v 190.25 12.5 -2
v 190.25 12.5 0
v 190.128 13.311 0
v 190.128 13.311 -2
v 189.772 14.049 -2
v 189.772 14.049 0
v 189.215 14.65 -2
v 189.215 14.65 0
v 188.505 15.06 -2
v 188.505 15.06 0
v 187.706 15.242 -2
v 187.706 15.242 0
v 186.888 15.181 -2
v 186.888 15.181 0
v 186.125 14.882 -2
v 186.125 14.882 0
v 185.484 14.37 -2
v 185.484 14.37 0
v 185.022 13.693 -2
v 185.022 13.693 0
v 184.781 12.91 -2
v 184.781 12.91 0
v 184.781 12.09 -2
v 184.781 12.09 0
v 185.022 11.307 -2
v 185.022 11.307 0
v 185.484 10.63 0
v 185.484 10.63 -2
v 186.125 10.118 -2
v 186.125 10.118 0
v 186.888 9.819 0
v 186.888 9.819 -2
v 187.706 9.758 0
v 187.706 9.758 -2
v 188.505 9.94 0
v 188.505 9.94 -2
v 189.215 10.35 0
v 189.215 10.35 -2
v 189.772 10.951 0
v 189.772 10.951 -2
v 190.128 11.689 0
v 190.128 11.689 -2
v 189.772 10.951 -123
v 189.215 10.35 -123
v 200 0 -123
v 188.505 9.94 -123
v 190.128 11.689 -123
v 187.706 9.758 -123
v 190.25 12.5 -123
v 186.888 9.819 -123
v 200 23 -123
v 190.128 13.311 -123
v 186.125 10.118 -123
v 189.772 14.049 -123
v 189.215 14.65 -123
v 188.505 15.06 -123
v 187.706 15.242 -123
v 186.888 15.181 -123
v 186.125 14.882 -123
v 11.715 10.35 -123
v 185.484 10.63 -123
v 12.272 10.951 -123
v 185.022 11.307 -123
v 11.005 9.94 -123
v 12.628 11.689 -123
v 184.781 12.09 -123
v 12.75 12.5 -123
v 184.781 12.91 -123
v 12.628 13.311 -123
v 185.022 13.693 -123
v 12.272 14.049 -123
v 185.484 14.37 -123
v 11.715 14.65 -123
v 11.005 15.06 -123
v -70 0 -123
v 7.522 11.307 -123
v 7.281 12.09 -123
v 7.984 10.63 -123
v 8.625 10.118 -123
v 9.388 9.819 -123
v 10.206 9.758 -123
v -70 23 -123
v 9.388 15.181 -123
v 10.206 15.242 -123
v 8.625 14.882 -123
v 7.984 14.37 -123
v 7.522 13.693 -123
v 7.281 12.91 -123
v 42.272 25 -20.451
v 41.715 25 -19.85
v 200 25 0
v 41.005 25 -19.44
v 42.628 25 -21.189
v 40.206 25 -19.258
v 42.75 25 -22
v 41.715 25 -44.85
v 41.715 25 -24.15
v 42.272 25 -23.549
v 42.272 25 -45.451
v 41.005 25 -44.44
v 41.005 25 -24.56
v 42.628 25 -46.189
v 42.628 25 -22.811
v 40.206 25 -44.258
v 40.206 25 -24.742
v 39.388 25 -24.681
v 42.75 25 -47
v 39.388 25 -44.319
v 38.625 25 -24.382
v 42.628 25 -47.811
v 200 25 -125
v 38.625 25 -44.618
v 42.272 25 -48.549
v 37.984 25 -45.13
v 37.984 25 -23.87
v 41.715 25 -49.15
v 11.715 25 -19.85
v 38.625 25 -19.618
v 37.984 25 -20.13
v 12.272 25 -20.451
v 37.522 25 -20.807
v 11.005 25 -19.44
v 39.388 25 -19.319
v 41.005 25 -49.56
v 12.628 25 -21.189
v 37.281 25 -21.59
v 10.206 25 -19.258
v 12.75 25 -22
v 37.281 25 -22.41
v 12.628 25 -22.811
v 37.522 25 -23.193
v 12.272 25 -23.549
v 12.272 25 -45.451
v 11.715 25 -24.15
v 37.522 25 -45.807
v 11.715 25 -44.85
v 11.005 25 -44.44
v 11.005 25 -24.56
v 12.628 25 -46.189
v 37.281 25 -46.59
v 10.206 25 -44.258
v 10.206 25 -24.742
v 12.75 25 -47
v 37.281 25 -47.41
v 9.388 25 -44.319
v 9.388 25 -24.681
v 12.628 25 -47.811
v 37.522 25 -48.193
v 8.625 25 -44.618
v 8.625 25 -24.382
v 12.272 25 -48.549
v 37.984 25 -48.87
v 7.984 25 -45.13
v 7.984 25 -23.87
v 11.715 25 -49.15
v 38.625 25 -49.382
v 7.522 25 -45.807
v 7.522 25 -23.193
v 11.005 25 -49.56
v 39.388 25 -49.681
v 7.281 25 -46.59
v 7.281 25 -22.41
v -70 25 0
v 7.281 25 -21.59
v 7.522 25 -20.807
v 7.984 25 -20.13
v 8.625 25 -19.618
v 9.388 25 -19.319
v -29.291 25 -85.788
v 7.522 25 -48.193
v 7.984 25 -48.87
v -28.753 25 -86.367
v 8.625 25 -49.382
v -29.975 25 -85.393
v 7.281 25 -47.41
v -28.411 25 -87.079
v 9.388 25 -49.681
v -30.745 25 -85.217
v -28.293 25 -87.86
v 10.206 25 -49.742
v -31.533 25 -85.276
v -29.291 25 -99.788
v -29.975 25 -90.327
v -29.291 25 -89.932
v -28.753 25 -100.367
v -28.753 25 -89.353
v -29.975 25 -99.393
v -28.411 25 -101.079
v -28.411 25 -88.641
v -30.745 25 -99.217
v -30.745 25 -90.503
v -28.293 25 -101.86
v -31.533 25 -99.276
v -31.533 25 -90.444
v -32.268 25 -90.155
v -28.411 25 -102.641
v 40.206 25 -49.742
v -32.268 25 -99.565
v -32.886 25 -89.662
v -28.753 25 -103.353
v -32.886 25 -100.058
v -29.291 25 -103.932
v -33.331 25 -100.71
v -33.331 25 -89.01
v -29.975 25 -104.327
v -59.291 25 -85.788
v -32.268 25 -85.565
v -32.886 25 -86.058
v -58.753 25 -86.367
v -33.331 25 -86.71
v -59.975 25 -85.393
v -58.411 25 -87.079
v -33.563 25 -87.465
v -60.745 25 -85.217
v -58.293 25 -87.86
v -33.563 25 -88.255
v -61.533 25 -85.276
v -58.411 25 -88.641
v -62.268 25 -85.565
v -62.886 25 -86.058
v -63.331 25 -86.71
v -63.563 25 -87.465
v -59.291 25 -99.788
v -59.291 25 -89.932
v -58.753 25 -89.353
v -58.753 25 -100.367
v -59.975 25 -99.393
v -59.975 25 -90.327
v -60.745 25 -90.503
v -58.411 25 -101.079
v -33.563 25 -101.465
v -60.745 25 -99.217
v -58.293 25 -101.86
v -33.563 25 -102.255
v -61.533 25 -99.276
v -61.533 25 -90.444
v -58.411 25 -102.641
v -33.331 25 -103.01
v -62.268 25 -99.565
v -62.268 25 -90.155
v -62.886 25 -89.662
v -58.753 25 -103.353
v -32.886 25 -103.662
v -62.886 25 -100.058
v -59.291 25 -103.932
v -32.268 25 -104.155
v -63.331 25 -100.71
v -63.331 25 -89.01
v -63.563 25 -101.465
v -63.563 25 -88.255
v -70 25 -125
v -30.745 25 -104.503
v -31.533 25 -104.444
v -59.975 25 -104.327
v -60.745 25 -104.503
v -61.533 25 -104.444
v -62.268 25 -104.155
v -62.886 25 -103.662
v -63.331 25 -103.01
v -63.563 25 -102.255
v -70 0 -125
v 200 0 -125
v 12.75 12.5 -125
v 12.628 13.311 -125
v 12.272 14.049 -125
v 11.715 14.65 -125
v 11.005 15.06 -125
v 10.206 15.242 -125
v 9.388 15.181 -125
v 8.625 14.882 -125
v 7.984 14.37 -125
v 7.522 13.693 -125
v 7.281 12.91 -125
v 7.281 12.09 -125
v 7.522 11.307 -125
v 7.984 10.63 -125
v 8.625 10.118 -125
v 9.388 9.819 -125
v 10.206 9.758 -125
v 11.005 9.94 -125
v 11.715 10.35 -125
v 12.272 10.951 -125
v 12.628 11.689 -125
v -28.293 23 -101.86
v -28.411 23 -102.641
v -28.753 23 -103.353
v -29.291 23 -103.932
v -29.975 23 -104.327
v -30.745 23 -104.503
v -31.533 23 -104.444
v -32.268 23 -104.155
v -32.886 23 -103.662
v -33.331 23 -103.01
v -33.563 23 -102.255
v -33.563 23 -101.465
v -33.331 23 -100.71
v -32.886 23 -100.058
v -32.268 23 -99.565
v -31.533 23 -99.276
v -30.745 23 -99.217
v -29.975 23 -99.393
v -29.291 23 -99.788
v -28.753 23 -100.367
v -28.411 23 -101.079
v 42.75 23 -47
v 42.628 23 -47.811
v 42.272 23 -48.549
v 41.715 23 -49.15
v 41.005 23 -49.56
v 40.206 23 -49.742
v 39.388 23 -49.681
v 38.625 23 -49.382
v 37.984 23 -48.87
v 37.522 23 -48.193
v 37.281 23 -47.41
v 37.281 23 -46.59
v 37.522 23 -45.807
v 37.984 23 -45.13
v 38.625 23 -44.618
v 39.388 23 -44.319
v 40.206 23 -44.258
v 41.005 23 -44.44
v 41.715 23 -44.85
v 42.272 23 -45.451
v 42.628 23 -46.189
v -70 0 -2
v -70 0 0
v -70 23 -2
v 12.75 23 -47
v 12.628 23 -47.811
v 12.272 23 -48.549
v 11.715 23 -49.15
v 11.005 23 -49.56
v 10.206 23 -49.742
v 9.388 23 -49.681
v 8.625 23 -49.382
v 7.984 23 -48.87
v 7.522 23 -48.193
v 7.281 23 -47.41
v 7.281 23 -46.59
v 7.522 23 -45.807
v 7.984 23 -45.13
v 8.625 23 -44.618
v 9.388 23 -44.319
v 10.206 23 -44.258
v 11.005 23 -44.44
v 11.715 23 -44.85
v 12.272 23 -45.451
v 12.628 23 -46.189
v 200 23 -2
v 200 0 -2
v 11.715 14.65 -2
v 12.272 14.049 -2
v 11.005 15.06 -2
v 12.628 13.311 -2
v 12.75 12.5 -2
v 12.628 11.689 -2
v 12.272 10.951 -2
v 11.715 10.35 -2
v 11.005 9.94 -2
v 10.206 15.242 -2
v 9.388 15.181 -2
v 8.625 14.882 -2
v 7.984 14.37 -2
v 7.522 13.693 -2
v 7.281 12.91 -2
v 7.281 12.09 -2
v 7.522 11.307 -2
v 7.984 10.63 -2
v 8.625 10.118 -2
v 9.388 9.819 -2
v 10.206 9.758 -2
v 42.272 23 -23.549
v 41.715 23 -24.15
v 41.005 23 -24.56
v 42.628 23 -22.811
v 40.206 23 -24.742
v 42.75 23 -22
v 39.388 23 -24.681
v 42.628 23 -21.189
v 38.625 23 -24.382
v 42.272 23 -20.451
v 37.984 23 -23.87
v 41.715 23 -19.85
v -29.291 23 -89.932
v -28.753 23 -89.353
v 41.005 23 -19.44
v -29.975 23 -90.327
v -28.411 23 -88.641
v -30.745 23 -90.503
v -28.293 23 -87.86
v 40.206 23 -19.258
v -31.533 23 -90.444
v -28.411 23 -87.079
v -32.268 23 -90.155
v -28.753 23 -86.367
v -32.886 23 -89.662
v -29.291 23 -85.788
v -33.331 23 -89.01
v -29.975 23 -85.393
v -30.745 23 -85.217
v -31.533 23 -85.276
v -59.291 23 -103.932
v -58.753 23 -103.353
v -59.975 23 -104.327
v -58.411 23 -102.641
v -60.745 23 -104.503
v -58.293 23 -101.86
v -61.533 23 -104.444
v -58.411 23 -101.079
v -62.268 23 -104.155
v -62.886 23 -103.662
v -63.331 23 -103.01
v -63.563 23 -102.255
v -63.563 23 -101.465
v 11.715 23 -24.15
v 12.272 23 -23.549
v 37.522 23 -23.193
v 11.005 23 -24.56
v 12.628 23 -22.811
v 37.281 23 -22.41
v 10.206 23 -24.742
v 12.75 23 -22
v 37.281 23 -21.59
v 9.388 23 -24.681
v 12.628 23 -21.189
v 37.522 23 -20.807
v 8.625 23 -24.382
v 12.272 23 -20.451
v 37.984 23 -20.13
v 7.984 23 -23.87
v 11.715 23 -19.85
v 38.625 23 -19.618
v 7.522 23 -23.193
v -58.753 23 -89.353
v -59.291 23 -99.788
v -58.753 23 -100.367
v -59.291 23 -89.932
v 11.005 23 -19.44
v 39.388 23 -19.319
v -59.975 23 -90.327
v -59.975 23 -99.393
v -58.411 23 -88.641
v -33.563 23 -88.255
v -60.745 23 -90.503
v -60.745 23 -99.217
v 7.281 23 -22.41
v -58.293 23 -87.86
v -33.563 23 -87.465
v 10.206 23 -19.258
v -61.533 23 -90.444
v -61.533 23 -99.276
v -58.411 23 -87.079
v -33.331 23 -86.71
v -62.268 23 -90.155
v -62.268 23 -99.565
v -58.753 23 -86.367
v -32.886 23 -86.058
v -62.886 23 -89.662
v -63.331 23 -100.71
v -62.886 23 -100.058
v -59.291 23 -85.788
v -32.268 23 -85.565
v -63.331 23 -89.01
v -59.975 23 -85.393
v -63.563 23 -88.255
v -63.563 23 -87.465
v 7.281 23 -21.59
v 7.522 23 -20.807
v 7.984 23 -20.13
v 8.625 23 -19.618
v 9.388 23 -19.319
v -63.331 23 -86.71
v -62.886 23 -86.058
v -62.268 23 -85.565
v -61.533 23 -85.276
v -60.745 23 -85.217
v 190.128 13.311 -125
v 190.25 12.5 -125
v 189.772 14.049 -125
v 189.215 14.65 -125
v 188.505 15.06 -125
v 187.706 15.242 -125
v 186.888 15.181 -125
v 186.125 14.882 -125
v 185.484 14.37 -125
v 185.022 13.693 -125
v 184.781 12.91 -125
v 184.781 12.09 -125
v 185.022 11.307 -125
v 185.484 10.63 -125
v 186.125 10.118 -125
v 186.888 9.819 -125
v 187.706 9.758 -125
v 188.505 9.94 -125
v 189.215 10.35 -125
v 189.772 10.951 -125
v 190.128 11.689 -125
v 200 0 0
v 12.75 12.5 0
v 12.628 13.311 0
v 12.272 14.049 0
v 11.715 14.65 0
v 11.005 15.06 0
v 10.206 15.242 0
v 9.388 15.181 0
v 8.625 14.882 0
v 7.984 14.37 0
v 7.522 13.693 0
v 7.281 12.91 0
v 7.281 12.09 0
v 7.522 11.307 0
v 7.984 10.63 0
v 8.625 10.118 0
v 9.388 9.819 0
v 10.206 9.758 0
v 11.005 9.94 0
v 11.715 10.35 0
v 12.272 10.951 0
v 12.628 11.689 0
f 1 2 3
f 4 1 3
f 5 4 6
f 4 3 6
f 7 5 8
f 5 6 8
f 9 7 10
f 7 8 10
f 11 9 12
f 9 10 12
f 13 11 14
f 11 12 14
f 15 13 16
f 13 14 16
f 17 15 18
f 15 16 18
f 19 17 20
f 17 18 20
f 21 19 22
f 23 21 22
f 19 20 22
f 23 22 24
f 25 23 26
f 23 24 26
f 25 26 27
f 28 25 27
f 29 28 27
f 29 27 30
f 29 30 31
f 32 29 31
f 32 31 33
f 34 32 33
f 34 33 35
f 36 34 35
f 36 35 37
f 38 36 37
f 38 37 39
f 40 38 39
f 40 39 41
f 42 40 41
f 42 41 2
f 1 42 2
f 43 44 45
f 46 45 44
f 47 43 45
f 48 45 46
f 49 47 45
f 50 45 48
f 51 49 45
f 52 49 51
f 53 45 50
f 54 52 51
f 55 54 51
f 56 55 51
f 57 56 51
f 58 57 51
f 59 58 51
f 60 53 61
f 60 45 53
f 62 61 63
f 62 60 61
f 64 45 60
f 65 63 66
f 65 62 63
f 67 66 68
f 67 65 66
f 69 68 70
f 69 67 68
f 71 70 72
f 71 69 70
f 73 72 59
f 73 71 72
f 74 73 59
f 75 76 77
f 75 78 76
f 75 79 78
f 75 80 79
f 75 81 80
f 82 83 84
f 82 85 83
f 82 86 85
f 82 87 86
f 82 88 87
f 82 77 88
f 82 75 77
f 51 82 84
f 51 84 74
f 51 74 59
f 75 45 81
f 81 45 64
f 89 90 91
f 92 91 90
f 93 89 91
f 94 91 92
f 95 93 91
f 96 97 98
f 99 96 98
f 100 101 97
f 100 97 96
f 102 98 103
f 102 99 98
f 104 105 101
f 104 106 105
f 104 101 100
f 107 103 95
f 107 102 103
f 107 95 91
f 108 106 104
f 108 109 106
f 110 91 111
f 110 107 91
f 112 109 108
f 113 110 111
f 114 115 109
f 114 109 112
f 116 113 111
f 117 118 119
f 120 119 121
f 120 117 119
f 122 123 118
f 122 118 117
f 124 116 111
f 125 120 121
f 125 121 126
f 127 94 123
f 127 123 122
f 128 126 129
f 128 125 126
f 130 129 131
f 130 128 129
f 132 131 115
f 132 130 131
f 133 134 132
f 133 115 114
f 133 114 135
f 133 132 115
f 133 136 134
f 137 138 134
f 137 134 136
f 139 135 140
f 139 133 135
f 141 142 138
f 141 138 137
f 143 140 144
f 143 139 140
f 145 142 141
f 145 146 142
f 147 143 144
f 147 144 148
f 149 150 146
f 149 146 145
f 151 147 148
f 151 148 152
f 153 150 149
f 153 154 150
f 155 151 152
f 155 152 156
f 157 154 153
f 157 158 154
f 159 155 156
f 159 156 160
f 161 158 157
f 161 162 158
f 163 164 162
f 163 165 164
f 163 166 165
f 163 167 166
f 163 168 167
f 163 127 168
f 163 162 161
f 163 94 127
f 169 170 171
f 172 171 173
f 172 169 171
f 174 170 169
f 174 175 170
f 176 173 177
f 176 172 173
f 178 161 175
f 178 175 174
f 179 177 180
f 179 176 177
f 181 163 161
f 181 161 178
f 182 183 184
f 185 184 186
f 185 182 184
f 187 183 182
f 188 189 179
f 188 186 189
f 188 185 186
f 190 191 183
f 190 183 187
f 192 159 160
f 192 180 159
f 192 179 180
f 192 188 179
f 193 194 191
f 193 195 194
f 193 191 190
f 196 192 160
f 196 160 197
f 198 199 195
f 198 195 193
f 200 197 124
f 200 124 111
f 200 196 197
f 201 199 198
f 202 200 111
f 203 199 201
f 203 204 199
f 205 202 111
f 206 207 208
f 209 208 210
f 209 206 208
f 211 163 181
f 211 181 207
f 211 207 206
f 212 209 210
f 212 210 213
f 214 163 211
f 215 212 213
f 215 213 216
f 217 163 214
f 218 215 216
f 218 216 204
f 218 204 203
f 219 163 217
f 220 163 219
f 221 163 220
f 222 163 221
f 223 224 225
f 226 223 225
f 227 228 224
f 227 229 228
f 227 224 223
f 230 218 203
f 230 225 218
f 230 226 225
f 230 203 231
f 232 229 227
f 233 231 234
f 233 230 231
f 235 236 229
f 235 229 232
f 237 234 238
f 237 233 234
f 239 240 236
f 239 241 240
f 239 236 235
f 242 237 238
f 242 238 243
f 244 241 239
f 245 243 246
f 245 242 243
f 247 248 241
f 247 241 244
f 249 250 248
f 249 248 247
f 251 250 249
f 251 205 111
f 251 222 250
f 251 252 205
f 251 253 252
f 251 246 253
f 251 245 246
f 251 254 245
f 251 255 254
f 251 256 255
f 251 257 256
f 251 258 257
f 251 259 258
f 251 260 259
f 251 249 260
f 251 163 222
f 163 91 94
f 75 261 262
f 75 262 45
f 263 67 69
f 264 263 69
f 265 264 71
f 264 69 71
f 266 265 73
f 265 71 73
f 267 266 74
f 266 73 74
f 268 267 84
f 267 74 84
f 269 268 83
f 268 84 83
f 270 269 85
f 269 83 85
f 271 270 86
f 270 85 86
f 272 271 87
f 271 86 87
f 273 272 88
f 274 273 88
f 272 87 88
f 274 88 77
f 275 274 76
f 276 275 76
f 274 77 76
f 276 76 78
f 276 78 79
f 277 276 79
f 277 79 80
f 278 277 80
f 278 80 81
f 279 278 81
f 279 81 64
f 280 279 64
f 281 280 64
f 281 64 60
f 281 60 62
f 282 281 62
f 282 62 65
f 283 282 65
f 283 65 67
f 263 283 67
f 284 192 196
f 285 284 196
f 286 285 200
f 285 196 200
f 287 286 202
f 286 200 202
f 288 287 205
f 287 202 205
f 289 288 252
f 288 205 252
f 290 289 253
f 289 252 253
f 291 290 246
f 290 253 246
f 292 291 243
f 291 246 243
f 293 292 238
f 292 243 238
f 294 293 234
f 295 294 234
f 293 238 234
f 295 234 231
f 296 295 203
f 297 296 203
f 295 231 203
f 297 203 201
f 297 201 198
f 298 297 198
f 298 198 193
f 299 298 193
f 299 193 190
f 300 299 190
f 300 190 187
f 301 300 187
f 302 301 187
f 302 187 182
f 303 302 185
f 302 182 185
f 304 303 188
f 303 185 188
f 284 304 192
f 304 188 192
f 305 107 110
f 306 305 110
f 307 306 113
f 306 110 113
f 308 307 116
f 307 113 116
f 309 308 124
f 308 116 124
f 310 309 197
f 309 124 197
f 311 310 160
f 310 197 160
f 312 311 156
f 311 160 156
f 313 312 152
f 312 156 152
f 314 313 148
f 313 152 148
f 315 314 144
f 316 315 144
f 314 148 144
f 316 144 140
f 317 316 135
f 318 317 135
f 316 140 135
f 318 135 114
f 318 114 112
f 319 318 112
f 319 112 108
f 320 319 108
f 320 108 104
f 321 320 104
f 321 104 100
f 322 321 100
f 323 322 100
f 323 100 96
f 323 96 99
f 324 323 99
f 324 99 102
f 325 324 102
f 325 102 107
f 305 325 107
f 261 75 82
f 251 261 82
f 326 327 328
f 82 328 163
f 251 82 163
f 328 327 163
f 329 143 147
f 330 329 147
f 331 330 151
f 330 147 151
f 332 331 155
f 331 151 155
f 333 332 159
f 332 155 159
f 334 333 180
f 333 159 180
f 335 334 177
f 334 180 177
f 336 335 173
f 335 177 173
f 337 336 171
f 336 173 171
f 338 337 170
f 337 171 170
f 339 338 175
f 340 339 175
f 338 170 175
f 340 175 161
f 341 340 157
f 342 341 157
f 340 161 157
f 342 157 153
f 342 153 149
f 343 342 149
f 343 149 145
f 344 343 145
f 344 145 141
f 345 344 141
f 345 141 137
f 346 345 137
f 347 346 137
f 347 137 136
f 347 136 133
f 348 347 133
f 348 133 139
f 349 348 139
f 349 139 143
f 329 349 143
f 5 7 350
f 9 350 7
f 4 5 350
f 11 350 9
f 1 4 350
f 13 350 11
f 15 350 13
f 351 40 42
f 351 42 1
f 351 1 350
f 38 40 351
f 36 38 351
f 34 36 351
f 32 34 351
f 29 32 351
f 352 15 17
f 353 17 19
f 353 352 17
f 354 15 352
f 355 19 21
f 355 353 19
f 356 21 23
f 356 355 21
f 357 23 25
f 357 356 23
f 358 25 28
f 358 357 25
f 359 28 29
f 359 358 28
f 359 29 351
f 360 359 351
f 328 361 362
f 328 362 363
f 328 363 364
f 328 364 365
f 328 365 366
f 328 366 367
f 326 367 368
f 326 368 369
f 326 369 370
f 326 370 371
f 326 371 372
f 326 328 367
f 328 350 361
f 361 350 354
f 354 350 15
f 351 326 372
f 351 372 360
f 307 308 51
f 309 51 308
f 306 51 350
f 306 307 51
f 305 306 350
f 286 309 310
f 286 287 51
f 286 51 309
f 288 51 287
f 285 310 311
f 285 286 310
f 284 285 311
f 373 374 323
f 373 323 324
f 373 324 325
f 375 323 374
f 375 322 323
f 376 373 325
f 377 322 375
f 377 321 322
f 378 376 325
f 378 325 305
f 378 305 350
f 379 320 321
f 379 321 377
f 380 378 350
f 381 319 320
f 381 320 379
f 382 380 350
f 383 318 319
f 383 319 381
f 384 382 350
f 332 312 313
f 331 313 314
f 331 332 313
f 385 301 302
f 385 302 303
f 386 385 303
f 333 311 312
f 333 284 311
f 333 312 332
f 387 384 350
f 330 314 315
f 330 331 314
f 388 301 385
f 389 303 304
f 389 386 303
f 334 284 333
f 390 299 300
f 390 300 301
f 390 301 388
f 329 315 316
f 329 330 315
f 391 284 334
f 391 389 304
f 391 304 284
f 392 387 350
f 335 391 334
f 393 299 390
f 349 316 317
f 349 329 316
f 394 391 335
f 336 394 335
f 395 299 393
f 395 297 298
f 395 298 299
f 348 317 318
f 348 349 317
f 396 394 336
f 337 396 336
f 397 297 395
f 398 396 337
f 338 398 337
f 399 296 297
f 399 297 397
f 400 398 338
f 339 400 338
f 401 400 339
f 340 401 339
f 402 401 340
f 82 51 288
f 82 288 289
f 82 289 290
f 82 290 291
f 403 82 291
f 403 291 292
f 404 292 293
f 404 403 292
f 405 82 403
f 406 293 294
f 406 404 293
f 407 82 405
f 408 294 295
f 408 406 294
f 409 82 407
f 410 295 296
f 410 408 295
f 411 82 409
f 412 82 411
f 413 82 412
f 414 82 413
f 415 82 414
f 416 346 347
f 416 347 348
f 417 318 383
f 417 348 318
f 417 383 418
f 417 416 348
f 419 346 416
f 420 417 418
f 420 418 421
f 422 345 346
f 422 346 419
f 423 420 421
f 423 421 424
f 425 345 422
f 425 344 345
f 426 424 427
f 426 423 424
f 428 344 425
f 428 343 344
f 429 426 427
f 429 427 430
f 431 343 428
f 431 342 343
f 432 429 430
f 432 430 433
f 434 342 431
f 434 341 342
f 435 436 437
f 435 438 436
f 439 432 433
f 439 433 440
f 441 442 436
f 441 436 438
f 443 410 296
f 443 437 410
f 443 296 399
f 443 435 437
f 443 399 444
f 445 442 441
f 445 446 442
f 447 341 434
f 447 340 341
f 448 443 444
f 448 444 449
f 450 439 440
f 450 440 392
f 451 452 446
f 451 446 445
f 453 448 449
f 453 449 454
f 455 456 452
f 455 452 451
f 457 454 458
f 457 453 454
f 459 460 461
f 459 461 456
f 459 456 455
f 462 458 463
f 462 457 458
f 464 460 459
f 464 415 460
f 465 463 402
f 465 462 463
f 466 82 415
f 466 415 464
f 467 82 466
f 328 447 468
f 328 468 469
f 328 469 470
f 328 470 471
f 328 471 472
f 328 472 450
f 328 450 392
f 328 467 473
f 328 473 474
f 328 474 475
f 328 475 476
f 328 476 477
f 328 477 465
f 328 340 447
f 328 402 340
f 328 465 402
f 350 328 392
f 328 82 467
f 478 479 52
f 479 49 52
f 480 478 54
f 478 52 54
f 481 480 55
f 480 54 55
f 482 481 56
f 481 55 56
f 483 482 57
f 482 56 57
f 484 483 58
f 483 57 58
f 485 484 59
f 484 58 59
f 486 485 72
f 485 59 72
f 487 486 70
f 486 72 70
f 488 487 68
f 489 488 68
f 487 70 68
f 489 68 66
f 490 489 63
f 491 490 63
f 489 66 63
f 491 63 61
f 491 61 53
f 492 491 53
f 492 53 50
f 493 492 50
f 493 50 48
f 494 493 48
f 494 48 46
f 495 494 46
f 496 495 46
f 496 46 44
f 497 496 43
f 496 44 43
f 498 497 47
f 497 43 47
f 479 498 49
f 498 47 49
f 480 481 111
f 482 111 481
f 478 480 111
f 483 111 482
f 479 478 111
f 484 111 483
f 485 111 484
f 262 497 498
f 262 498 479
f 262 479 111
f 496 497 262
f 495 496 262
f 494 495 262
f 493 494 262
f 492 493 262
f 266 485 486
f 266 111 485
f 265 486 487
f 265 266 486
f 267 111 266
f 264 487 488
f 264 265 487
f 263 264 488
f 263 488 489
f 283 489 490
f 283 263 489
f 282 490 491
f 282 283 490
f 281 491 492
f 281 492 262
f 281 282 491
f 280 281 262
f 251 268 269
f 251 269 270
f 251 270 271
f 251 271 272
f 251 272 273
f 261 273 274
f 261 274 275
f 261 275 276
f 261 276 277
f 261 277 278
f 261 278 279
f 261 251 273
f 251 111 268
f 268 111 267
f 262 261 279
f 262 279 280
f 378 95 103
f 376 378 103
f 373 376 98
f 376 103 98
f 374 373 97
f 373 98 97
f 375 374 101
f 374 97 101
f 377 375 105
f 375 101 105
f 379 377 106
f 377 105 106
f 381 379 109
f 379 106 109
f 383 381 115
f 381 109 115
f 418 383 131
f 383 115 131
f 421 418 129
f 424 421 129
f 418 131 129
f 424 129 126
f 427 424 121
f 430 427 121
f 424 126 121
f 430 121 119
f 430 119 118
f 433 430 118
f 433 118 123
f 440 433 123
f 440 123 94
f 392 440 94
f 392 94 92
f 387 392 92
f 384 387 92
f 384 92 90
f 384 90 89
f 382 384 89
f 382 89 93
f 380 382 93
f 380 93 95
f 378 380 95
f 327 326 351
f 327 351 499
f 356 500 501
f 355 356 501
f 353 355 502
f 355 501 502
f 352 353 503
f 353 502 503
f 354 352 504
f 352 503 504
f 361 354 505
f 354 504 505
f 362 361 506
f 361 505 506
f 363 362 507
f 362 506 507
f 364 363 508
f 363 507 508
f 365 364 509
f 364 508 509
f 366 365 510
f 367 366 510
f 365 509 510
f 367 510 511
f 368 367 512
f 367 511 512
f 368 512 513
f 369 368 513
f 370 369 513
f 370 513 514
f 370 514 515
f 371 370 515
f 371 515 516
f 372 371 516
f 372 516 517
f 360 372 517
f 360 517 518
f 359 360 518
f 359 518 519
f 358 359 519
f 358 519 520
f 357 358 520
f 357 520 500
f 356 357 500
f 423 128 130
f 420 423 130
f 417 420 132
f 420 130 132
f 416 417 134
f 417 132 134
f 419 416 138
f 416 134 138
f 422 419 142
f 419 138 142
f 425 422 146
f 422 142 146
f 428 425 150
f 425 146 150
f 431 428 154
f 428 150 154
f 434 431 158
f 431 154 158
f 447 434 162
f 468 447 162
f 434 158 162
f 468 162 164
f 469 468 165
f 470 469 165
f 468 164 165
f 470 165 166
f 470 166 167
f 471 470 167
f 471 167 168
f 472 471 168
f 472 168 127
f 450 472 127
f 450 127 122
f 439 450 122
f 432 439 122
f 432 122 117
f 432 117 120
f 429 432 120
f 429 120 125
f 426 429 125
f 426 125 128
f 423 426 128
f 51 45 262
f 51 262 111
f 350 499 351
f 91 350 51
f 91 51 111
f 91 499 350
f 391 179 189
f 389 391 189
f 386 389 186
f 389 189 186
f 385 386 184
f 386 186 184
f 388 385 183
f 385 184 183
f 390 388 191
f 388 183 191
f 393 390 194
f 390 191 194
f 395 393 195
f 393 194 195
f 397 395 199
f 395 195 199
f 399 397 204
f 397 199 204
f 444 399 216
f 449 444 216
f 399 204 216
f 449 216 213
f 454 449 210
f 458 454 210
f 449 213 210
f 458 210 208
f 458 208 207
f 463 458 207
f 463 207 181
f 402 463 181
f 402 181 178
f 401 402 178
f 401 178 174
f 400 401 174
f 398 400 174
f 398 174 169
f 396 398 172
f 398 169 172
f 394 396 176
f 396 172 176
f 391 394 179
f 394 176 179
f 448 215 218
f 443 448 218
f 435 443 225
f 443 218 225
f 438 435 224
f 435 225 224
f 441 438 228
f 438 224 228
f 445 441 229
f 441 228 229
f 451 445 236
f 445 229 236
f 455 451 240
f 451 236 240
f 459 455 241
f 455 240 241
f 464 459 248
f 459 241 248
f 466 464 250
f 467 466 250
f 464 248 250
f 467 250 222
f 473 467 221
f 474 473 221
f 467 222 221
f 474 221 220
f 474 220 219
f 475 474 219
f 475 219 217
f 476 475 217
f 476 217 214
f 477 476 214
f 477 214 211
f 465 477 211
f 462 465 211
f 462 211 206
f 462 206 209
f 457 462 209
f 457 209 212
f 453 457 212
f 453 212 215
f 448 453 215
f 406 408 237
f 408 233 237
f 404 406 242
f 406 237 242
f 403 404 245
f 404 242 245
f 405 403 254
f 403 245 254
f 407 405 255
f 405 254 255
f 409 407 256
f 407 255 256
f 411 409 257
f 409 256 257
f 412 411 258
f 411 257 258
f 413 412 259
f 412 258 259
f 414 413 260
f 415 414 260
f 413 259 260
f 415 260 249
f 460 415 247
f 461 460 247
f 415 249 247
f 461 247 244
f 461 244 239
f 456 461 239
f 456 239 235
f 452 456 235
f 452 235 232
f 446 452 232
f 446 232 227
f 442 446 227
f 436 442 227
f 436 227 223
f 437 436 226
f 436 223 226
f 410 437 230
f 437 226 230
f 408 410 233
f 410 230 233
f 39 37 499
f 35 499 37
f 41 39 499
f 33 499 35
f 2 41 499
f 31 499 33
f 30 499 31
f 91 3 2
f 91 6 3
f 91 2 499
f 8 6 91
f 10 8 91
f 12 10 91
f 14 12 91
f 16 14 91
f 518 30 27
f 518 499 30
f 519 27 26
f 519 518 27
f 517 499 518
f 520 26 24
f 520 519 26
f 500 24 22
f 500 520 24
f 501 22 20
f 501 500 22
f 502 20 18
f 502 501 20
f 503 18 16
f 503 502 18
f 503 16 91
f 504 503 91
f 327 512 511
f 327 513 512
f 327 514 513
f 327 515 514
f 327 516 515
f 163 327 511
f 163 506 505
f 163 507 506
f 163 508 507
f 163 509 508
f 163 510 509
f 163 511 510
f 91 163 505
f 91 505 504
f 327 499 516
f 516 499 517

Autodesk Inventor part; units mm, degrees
ref_plane "YZ Plane" through (0, 0, 0) normal (1, 0, 0) x (0, 1, 0)
ref_plane "XZ Plane" through (0, 0, 0) normal (0, 1, 0) x (-1, 0, 0)
ref_plane "XY Plane" through (0, 0, 0) normal (0, 0, 1) x (1, 0, 0)
sketch "Sketch1" plane through (0, 0, 0) normal (1, 0, 0) x (0, 1, 0)
  line L0 (0, 0) -> (25, 0)
  line L1 (25, 0) -> (25, -125)
  line L2 (25, -125) -> (0, -125)
  line L3 (0, -125) -> (0, -123)
  line L4 (0, -123) -> (23, -123)
  line L5 (23, -123) -> (23, -2)
  line L6 (23, -2) -> (0, -2)
  line L7 (0, -2) -> (0, 0)
  dimension "d0" = 2
  dimension "d1" = 2
  dimension "d2" = 125
  dimension "d3" = 25
  dimension "d4" = 2
extrude "Extrusion1" add sketch "Sketch1" along normal blind 200 and the other way blind 70
sketch "Sketch2" plane through (-70, 25, 0) normal (0, 1, 0) x (1, 0, 0)
  circle A0 centre (80, 22) radius 2.75
  circle A1 centre (80, 47) radius 2.75
  circle A2 centre (110, 22) radius 2.75
  circle A3 centre (110, 47) radius 2.75
  line L0 (0, 0) -> (0, 125) projected
  line L1 (270, 0) -> (0, 0) projected
  circle A4 centre (9.057, 101.86) radius 2.65
  circle A5 centre (9.057, 87.86) radius 2.65
  circle A6 centre (39.057, 101.86) radius 2.65
  circle A7 centre (39.057, 87.86) radius 2.65
  line L2 (270, 125) -> (0, 125) projected
  point P0 (70, 0)
  dimension "d9" = 5.5
  dimension "d10" = 5.5
  dimension "d11" = 5.5
  dimension "d12" = 5.5
  dimension "d13" = 80
  dimension "d14" = 80
  dimension "d15" = 22
  dimension "d16" = 110
  dimension "d17" = 110
  dimension "d18" = 22
  dimension "d19" = 25
  dimension "d20" = 25
  dimension "d23" = 5.3
  dimension "d24" = 5.3
  dimension "d25" = 5.3
  dimension "d26" = 5.3
  dimension "d27" = 9.057
  dimension "d28" = 9.057
  dimension "d29" = 14
  dimension "d30" = 30
  dimension "d31" = 30
  dimension "d32" = 14
  dimension "d33" = 30
  dimension "d34" = 14
  dimension "d36" = 23.14
extrude "Extrusion2" cut sketch "Sketch2" against normal blind 10
sketch "Sketch3" plane through (-70, 0, 0) normal (0, 0, 1) x (1, 0, 0)
  circle A0 centre (80, 12.5) radius 2.75
  line L0 (0, 0) -> (270, 0) projected
  line L1 (0, 0) -> (0, 25) projected
  circle A1 centre (257.5, 12.5) radius 2.75
  line L2 (270, 25) -> (0, 25) projected
  line L3 (270, 25) -> (270, 0) projected
  point P0 (70, 0)
  dimension "d37" = 5.5
  dimension "d38" = 12.5
  dimension "d39" = 80
  dimension "d40" = 5.5
  dimension "d41" = 12.5
  dimension "d42" = 12.5
extrude "Extrusion3" cut sketch "Sketch3" against normal blind 142 contours A0 | A1
properties part number "Spacer Extrusion" material "Aluminum 6061"
